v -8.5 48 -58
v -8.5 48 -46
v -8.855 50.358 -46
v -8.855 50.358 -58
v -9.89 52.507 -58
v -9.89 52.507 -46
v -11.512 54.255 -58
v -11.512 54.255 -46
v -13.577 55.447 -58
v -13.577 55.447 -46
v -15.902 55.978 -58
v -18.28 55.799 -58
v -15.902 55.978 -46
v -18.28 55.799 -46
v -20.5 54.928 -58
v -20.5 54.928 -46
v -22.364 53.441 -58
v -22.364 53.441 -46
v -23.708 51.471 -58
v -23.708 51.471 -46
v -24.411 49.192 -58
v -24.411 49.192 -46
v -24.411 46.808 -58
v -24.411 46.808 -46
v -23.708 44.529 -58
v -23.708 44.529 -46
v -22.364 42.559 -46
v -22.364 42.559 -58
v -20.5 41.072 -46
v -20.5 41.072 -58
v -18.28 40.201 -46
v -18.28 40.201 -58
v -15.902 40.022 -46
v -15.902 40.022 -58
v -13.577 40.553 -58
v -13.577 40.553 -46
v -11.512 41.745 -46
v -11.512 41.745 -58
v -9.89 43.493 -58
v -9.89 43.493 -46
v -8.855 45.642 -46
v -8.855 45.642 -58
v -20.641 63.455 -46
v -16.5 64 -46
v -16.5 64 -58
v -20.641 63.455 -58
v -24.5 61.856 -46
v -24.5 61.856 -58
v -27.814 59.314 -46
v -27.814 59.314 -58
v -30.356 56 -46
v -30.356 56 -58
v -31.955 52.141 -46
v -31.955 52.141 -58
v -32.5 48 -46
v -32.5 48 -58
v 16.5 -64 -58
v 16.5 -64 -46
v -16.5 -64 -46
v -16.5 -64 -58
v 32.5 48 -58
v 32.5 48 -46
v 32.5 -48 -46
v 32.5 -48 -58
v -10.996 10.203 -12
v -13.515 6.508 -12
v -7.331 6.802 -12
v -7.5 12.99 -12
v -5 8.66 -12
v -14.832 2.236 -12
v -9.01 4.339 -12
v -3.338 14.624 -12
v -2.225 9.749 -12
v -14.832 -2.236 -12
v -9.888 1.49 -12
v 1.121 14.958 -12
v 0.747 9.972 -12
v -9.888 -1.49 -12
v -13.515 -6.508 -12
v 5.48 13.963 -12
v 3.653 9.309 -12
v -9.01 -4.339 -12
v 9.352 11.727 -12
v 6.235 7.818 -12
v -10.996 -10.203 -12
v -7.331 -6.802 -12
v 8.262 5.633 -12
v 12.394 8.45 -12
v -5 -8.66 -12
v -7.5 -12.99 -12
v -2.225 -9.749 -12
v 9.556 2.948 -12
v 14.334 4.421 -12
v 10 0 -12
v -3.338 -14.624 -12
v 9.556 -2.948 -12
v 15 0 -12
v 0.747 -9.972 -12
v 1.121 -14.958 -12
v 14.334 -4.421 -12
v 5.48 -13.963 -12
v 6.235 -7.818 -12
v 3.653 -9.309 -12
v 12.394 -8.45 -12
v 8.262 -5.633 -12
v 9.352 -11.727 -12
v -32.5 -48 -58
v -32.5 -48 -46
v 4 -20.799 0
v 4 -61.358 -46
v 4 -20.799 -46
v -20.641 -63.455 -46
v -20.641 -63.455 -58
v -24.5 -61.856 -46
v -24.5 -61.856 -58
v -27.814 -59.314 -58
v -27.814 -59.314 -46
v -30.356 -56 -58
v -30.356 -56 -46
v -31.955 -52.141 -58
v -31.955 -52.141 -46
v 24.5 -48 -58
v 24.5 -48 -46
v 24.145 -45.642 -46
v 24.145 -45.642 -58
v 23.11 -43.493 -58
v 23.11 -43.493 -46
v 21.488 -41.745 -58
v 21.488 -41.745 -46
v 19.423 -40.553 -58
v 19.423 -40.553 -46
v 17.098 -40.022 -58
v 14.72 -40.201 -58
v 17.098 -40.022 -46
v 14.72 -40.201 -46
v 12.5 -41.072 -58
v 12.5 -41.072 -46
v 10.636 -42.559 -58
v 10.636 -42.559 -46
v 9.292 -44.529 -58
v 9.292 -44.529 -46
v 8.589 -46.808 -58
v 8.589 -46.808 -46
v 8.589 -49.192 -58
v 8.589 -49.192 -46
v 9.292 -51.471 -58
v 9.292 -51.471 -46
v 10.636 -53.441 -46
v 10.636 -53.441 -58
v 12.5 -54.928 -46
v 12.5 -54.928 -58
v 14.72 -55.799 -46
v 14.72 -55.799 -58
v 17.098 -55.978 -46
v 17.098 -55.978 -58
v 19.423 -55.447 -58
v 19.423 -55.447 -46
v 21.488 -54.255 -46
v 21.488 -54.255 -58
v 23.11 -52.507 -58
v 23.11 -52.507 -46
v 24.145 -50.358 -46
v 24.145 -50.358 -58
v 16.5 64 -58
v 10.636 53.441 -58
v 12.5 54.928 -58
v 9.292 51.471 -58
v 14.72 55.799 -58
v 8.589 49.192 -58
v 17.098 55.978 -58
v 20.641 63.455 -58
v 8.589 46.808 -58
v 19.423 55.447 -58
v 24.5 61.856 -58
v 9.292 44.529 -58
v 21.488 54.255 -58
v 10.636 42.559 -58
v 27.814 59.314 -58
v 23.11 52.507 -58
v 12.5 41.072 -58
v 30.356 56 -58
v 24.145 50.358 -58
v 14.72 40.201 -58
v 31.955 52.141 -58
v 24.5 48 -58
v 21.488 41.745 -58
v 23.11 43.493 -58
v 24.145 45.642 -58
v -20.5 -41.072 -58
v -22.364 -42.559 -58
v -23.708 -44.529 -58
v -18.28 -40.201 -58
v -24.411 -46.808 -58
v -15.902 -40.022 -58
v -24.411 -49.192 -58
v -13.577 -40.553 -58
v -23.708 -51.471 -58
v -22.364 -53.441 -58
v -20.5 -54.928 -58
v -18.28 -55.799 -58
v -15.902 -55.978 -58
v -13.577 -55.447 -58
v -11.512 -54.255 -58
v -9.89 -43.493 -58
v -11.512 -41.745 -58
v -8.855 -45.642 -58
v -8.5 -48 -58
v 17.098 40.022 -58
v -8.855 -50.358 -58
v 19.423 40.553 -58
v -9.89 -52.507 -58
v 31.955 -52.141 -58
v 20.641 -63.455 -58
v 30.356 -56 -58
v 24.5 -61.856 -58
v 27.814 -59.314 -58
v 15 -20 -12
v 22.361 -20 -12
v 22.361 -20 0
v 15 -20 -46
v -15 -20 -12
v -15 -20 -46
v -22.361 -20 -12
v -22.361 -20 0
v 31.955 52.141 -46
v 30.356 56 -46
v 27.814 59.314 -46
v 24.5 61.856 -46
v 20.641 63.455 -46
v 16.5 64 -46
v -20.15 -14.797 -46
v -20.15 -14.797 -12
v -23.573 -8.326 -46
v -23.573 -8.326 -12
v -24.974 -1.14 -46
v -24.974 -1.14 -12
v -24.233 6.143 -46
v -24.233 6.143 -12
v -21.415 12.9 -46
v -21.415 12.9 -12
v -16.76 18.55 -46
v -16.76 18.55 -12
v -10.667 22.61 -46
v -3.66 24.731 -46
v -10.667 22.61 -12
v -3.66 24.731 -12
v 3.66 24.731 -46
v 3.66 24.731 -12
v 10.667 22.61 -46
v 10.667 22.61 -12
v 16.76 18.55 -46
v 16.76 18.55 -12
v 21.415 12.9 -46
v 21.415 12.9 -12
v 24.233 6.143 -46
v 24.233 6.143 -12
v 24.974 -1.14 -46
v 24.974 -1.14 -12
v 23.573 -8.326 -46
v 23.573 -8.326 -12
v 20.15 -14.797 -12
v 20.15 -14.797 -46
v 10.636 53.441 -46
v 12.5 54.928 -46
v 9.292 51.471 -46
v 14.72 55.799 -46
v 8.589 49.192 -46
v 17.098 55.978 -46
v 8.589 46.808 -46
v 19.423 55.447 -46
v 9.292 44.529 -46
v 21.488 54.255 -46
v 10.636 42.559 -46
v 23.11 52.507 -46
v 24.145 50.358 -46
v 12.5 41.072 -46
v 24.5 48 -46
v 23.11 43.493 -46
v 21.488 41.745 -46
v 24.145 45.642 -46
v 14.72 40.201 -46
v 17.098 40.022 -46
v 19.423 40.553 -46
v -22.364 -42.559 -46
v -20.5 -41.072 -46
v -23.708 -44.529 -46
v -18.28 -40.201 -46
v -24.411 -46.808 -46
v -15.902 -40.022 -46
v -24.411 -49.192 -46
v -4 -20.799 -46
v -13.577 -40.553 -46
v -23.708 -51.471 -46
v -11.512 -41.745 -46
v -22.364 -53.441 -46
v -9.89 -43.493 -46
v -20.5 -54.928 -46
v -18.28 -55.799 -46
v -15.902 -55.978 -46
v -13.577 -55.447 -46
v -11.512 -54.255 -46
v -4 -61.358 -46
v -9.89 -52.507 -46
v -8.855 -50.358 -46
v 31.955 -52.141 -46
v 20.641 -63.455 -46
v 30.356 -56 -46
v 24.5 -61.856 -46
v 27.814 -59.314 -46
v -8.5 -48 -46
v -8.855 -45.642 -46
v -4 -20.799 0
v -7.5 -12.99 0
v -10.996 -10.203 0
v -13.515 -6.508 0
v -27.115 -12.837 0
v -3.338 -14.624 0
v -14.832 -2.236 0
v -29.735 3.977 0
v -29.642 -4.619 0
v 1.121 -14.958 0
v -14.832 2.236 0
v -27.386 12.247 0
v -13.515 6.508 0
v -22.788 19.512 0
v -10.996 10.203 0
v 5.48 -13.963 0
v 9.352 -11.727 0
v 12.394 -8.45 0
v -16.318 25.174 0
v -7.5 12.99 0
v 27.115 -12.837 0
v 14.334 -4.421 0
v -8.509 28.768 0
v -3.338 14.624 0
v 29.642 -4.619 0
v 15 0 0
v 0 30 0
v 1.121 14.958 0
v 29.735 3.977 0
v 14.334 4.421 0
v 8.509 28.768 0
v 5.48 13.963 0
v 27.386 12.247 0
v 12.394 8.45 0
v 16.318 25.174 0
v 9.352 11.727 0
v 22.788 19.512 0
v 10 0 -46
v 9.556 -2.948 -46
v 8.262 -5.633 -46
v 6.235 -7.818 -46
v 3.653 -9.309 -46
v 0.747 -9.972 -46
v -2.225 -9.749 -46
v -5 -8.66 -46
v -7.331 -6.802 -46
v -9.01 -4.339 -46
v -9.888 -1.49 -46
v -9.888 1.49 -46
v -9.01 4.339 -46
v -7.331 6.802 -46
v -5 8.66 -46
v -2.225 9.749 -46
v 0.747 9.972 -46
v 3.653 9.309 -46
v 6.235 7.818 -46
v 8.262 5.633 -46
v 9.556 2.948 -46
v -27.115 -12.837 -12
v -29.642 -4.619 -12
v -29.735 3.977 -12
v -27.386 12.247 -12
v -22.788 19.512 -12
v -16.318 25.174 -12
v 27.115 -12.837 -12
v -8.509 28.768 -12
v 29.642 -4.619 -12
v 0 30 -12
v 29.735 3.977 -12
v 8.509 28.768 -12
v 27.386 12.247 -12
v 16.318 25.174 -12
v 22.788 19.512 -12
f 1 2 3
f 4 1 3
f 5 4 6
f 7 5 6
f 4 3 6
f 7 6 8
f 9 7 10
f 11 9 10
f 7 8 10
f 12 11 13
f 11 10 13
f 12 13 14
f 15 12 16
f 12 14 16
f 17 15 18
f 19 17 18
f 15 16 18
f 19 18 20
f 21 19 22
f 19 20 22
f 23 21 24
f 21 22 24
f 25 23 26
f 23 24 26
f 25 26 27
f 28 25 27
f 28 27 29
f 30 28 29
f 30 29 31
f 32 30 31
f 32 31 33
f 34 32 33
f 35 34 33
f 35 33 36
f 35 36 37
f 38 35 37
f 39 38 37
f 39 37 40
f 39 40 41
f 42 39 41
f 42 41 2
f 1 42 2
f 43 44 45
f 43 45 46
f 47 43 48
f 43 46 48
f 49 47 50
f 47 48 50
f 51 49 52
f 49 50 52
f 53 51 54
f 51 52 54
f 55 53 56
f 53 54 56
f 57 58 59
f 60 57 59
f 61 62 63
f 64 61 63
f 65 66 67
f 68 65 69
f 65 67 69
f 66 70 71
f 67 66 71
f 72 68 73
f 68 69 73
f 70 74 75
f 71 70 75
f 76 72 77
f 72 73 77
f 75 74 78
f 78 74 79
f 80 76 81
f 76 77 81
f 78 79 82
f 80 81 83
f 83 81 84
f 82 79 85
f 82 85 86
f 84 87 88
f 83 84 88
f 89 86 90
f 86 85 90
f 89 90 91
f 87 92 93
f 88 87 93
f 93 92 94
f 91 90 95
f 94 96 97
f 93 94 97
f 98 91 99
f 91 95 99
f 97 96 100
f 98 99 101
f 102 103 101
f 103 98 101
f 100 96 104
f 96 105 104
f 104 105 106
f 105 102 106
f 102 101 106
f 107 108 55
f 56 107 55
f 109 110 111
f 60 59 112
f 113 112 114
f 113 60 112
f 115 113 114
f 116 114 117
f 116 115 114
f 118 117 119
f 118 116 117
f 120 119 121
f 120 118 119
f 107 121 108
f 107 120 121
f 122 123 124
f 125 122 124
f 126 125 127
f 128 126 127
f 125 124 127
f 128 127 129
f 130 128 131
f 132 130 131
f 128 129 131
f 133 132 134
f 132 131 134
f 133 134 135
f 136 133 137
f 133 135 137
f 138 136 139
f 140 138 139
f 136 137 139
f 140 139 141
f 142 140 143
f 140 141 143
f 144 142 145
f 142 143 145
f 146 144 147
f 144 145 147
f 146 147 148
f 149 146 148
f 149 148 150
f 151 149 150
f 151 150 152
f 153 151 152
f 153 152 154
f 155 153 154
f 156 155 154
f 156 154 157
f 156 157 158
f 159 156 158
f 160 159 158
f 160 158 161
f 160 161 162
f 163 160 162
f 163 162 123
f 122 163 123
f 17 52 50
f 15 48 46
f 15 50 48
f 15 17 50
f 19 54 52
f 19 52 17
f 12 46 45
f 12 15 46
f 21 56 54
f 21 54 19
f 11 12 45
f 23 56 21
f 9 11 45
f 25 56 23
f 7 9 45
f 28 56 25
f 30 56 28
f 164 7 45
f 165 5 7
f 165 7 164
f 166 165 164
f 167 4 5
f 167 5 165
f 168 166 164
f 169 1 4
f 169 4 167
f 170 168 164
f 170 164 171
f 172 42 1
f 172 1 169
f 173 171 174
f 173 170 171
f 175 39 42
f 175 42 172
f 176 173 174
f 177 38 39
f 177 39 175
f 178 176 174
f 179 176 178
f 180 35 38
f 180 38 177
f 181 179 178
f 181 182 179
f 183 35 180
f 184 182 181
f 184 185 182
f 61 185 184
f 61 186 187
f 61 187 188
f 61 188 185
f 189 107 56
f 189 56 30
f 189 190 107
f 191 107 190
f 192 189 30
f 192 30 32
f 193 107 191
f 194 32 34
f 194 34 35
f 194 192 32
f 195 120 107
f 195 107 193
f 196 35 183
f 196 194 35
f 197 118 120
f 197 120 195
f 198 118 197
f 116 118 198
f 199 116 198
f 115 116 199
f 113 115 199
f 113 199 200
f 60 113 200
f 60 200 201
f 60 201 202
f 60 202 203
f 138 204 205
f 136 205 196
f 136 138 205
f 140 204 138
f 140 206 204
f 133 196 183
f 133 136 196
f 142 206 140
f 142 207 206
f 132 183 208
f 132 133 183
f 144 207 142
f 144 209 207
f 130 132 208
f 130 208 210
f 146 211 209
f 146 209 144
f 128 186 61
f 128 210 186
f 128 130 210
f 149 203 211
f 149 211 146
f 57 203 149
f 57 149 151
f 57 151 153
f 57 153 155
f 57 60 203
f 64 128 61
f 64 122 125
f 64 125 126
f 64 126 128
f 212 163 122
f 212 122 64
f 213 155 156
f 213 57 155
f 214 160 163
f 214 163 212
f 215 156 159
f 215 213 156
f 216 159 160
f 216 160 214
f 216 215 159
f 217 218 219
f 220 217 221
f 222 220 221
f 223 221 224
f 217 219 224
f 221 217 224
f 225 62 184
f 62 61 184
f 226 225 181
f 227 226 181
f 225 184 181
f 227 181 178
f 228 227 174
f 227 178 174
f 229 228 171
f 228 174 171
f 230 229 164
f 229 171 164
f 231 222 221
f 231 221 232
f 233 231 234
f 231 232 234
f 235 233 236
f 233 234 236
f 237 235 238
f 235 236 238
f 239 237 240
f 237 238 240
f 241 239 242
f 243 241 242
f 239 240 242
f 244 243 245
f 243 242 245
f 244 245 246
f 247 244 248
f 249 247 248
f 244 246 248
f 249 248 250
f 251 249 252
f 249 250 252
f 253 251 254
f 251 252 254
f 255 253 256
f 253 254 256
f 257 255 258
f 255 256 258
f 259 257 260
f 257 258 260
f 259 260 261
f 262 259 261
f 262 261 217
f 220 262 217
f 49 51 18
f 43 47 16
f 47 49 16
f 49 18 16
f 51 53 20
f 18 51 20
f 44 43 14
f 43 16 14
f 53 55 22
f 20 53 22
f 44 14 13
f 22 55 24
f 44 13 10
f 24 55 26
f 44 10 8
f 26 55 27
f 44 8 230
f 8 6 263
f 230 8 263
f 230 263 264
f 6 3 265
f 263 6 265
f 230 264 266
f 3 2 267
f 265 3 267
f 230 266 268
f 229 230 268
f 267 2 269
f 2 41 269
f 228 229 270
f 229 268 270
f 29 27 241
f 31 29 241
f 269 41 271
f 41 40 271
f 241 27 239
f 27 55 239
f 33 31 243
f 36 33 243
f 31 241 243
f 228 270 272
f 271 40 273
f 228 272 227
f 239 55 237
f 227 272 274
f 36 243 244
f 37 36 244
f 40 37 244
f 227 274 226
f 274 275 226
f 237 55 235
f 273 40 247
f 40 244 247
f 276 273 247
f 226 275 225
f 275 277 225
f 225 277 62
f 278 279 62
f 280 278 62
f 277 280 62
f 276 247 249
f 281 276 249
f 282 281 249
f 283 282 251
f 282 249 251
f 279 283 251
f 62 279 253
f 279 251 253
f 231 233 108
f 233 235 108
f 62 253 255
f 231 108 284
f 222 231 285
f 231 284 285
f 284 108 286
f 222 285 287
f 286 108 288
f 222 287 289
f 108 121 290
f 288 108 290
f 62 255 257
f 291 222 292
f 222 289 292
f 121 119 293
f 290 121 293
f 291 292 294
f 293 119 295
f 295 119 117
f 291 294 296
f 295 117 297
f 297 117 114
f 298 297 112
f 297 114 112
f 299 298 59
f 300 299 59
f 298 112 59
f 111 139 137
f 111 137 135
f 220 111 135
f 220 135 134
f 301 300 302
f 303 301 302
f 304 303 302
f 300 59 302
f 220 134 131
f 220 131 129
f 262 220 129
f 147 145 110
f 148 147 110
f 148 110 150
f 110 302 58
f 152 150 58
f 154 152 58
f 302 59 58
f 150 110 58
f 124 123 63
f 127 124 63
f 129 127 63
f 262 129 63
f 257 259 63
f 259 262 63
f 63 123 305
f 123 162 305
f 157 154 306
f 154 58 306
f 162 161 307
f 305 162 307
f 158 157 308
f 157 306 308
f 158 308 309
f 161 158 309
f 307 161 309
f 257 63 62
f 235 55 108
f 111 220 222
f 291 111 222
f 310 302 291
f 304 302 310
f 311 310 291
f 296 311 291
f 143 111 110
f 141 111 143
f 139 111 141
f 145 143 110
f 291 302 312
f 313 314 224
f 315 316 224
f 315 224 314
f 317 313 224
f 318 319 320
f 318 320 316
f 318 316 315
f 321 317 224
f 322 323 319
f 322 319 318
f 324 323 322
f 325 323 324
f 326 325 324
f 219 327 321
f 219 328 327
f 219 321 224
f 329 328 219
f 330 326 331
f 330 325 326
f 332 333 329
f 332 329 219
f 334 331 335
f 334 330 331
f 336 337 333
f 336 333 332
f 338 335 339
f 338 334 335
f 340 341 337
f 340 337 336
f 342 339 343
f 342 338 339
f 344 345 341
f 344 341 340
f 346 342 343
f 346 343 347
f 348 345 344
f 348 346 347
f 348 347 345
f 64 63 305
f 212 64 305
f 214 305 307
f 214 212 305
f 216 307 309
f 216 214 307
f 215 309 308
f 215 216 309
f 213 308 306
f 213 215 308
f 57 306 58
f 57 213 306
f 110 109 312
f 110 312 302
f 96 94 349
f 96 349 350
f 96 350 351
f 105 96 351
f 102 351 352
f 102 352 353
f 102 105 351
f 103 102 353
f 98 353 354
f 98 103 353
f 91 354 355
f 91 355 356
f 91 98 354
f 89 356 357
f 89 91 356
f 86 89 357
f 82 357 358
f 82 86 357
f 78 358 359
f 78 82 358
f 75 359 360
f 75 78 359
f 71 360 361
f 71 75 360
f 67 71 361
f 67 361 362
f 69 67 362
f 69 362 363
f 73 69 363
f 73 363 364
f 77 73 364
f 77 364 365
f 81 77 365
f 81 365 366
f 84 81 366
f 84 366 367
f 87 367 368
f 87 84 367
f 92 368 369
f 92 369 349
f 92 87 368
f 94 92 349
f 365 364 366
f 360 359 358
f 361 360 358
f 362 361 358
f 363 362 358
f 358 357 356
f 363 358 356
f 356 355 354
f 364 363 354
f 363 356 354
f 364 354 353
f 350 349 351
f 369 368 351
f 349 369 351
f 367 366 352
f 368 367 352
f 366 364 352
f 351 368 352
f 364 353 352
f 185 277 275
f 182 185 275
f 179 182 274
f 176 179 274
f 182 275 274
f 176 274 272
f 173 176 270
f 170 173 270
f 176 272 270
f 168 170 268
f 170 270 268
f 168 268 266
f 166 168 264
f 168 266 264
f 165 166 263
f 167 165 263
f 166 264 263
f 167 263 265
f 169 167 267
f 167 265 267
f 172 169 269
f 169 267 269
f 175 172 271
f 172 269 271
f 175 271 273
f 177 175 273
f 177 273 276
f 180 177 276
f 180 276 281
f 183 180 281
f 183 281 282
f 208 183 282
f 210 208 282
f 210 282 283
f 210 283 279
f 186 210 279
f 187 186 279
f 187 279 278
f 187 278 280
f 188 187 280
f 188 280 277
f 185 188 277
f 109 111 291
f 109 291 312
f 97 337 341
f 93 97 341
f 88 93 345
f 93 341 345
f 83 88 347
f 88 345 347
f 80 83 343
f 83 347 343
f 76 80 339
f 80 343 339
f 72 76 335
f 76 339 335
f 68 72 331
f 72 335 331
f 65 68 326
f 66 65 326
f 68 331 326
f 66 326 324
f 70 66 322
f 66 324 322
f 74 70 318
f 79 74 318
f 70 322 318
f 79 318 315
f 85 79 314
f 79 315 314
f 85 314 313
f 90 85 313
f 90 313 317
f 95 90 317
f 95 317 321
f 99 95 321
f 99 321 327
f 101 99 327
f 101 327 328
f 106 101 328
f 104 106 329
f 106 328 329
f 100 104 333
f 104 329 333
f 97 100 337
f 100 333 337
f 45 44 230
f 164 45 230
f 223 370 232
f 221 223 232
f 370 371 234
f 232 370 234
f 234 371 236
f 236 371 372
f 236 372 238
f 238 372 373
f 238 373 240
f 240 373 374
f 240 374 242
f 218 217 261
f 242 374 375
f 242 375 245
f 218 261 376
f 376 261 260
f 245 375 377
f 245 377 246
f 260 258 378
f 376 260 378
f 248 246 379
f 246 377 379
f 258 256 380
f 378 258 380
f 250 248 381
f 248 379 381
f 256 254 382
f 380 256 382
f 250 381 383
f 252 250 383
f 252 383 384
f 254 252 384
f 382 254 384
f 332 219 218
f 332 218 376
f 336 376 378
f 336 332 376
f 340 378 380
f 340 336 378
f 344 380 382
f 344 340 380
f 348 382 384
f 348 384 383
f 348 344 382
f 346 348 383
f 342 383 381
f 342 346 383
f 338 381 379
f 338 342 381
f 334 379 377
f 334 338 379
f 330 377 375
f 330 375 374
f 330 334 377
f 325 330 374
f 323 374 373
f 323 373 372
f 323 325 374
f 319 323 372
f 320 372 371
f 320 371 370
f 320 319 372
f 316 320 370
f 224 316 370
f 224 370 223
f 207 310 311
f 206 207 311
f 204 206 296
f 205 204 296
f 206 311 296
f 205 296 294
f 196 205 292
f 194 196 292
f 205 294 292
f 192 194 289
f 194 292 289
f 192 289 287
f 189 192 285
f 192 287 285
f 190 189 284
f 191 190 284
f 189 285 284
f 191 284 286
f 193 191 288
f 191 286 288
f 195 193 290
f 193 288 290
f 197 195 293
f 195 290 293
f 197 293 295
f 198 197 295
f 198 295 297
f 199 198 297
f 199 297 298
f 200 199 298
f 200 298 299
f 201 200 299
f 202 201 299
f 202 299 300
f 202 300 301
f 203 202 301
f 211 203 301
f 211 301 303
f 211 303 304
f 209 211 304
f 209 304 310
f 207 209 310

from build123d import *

# Parameters (mm, degrees)
F0_R      = 15
F1_DEPTH  = 12
F2_R      = 10
F3_DEPTH  = 34
F4_W      = 32.5
F4_H      = 64
F5_DEPTH  = 12
F6_R      = 16
F7_R      = 8
F8_DEPTH  = 12.001
F10_DEPTH = 4


with BuildPart() as f1:
    # F0 (on Top) → F1 (new body)
    with BuildSketch(Plane.XY):
        with BuildLine():
            Line((-22.36068, -20), (22.36068, -20))
            ThreePointArc((22.36068, -20), (0, 30), (-22.36068, -20))
        make_face()
        Circle(F0_R, mode=Mode.SUBTRACT)
    extrude(amount=-F1_DEPTH)

    # F2 (on face) → F3 (join)
    with BuildSketch(Plane(origin=(0, 0, -12), x_dir=(1, 0, 0), z_dir=(0, 0, -1))):
        with BuildLine():
            Line((15, 20), (-15, 20))
            ThreePointArc((-15, 20), (0, -25), (15, 20))
        make_face()
        Circle(F2_R, mode=Mode.SUBTRACT)
    extrude(amount=F3_DEPTH)

    # F4 (on face) → F5 (join)
    with BuildSketch(Plane(origin=(0, 0, -46), x_dir=(1, 0, 0), z_dir=(0, 0, -1))):
        with Locations((16.25, 32)):
            Rectangle(F4_W, F4_H)
        with Locations((16.25, -32)):
            Rectangle(F4_W, F4_H)
        with Locations((-16.25, 32)):
            Rectangle(F4_W, F4_H)
        with Locations((-16.25, -32)):
            Rectangle(F4_W, F4_H)
    extrude(amount=F5_DEPTH)

    # F6
    f6_edges = [f1.edges().sort_by_distance(p)[0] for p in [
        (-32.5, 64, -52),
        (32.5, 64, -52),
        (-32.5, -64, -52),
        (32.5, -64, -52),
    ]]
    fillet(f6_edges, radius=F6_R)

    # F7 (on face) → F8 (cut, through all)
    with BuildSketch(Plane.XY.offset(-46)):
        with Locations((16.5, 48)):
            Circle(F7_R)
        with Locations((-16.5, 48)):
            Circle(F7_R)
        with Locations((-16.5, -48)):
            Circle(F7_R)
        with Locations((16.5, -48)):
            Circle(F7_R)
    extrude(amount=-F8_DEPTH, mode=Mode.SUBTRACT)

    # F9 (on Right) → F10 (join, symmetric)
    with BuildSketch(Plane.YZ):
        Polygon((-20.799277, -46.774581), (-20.799277, 0), (-62.041331, -46.774581), align=None)
    extrude(amount=F10_DEPTH, both=True)


solid = f1.part
